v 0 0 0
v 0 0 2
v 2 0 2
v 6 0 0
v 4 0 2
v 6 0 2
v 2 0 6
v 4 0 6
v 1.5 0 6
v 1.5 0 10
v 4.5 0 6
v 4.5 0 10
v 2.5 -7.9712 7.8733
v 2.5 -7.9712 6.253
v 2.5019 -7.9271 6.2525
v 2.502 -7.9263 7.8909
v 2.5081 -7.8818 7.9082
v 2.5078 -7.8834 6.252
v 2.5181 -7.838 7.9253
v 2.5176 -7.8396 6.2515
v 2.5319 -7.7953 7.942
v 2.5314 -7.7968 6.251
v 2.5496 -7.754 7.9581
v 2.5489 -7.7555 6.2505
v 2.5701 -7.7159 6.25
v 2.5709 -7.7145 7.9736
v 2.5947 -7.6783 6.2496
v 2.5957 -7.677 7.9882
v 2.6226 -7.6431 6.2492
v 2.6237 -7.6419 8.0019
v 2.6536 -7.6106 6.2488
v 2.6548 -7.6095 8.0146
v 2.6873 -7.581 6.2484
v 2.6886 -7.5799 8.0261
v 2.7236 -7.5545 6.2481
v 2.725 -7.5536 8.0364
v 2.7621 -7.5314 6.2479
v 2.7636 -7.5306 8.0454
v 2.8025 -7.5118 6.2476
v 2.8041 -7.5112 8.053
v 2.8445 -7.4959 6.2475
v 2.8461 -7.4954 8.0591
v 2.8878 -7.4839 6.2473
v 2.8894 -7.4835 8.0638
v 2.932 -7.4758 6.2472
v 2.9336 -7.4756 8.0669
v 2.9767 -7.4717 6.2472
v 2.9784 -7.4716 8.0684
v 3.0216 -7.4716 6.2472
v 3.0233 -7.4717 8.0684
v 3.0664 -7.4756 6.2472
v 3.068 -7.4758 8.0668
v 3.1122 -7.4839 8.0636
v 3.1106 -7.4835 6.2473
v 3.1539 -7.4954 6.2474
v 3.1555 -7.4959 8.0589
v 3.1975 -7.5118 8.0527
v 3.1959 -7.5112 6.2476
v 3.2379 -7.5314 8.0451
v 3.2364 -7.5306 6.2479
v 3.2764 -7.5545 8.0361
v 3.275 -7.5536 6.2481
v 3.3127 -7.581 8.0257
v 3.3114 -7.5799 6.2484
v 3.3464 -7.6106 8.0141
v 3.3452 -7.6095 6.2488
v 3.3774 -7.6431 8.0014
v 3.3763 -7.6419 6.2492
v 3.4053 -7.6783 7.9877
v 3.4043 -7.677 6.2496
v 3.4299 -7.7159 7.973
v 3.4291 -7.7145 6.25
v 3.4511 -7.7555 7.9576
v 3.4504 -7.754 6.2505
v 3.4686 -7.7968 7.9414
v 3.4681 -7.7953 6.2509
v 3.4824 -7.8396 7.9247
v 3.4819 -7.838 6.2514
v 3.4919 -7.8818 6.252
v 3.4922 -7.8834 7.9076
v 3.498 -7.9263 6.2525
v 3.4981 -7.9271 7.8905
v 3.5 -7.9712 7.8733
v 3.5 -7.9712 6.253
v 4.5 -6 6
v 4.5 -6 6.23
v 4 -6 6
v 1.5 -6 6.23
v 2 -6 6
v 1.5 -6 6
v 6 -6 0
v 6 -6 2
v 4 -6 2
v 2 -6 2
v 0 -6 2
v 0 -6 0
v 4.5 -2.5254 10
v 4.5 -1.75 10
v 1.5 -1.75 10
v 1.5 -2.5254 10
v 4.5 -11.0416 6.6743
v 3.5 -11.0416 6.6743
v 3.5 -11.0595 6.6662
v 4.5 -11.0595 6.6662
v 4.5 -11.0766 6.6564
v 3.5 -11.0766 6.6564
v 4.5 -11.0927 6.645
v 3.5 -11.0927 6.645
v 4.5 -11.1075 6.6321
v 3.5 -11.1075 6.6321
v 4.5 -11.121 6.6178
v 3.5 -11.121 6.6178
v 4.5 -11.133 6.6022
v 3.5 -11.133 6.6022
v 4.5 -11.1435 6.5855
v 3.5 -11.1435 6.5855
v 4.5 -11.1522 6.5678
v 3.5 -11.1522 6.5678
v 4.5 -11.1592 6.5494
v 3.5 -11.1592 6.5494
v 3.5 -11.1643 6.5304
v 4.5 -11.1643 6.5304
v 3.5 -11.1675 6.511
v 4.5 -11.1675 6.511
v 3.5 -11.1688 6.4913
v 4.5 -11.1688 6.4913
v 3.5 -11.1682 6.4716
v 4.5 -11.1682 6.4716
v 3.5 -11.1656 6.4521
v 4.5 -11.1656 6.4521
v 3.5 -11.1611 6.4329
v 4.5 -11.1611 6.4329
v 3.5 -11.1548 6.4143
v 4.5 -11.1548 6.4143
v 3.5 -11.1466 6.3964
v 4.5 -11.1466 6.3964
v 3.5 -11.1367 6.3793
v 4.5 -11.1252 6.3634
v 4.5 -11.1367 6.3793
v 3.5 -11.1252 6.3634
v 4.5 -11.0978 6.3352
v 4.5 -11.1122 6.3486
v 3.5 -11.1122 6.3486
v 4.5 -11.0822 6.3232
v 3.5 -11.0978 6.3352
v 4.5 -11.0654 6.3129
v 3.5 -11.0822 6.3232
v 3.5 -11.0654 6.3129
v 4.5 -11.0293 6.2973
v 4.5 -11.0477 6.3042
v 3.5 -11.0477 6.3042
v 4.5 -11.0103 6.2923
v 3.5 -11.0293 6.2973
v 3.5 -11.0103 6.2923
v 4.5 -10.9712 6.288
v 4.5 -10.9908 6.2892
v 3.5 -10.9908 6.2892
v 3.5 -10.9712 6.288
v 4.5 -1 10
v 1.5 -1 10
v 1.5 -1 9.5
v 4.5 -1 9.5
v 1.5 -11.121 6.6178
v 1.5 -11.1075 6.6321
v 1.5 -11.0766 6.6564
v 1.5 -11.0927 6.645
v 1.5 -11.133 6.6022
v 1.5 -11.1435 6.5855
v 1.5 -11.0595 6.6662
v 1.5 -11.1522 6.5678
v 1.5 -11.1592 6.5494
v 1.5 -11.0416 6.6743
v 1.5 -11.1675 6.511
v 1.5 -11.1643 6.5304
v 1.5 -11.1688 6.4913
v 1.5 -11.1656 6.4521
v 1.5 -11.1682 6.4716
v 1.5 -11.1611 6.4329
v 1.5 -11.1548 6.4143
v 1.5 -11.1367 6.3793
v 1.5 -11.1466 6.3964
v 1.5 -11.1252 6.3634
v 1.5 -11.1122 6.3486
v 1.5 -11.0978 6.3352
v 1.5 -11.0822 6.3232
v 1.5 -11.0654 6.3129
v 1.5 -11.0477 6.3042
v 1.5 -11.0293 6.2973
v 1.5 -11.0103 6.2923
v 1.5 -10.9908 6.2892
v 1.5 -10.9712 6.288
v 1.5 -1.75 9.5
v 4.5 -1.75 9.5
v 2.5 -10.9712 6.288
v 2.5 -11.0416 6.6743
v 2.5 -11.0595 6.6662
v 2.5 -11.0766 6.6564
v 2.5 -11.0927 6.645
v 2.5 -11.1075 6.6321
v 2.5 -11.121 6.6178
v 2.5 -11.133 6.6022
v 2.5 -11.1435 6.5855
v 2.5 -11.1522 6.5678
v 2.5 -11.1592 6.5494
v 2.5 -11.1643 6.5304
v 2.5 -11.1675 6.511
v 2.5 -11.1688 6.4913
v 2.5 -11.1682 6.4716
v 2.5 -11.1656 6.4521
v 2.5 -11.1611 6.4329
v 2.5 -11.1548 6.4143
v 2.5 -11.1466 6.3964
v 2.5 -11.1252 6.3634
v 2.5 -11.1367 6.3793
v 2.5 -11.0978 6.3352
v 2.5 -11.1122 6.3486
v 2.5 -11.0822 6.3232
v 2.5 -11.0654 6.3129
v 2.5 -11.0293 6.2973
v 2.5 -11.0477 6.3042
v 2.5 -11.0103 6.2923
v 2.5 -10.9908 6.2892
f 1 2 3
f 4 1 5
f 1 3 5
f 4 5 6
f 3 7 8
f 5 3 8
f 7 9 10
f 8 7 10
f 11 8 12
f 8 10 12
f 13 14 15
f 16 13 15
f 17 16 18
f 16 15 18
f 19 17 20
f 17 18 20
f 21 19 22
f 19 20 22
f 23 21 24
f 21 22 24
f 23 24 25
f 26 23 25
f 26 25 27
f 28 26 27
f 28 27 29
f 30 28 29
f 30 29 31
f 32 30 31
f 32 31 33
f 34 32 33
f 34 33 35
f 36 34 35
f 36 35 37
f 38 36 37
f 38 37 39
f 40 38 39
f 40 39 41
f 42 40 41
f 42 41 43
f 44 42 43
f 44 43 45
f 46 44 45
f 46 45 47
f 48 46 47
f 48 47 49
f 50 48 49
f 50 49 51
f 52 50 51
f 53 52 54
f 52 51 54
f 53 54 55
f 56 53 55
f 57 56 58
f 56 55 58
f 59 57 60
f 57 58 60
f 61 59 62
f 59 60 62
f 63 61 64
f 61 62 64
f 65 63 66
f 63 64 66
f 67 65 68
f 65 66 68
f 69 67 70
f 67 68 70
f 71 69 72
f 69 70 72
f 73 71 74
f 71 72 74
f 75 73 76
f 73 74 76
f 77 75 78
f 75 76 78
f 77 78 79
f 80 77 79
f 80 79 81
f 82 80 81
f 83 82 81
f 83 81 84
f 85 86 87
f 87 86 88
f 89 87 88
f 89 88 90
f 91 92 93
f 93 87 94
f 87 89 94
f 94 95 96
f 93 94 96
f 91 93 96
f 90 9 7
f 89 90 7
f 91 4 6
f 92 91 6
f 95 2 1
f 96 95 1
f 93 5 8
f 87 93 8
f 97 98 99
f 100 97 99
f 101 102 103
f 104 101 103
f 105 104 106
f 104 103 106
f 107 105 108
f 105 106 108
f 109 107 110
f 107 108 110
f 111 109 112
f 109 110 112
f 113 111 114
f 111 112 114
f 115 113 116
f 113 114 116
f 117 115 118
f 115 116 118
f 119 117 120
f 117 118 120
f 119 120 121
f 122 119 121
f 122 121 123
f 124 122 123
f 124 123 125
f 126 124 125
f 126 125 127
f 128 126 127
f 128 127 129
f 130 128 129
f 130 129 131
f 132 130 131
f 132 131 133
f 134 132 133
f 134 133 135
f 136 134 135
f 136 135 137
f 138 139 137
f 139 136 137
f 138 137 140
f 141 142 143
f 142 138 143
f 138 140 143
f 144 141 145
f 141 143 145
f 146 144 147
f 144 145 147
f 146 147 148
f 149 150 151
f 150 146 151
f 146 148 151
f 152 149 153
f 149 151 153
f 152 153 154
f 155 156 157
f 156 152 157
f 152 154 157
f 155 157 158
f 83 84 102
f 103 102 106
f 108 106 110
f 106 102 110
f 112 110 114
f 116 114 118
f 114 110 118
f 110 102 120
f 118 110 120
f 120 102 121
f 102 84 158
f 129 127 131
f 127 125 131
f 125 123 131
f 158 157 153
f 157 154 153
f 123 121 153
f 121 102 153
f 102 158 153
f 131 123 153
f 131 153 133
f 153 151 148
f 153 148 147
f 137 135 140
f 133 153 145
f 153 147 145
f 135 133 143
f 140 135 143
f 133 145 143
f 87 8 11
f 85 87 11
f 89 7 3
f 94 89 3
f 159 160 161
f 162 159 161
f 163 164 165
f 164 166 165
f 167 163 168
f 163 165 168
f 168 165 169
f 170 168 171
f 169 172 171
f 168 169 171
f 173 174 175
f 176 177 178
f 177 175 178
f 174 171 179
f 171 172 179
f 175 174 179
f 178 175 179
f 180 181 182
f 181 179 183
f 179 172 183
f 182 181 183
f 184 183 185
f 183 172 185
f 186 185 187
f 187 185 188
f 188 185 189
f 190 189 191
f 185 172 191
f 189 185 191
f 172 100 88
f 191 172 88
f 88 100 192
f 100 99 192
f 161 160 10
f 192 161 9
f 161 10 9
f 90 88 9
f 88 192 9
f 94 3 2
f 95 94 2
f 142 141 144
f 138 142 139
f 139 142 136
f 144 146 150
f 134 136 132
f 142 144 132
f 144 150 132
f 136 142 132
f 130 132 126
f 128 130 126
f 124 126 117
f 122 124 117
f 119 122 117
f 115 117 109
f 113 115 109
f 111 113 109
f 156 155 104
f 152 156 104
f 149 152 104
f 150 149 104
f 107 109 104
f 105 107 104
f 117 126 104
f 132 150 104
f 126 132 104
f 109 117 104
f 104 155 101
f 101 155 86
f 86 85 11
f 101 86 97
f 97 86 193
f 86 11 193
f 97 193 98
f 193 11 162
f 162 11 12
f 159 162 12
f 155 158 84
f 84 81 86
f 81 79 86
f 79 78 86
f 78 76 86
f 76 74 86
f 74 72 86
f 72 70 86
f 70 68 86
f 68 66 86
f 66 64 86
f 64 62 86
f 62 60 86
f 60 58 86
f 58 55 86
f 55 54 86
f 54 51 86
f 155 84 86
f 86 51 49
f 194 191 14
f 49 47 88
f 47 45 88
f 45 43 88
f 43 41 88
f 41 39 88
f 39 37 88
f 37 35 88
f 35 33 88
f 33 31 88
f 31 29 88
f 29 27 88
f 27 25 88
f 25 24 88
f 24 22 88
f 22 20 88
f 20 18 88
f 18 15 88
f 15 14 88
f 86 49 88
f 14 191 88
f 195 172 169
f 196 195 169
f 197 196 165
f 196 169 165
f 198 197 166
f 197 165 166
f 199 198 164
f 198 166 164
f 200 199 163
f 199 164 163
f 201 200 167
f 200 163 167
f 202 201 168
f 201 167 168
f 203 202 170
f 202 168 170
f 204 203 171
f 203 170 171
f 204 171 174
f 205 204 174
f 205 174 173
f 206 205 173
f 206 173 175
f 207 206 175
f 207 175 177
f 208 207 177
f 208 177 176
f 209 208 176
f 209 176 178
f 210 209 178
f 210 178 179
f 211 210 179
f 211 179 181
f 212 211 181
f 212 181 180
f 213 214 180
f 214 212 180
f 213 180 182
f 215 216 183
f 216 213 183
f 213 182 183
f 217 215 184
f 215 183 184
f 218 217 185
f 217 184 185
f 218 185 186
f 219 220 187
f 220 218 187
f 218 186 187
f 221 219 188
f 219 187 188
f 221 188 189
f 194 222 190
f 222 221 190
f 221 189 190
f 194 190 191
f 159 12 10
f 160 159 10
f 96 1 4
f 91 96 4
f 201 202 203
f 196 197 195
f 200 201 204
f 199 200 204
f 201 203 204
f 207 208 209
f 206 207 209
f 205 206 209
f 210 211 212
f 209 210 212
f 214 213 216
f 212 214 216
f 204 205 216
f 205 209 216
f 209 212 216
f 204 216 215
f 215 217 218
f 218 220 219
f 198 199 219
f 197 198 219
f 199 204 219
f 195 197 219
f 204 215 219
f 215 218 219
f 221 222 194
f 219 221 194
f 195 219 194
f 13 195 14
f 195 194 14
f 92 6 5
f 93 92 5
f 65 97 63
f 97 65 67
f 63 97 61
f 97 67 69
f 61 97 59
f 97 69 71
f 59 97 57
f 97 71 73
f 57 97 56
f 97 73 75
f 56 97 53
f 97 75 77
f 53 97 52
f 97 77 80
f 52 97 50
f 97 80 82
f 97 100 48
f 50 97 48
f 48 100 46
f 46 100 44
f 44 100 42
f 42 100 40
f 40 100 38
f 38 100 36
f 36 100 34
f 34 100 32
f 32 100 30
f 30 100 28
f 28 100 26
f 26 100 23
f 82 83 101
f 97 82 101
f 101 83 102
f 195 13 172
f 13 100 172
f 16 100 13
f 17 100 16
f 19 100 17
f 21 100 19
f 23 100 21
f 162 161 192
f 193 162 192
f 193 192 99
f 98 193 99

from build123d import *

# Parameters (mm, degrees)
F1_DEPTH = 12
F3_DEPTH = 25
F5_DEPTH = 25


with BuildPart() as f1:
    # F0 (on Front) → F1 (new body)
    with BuildSketch(Plane.XZ):
        Polygon((0, 2), (0, 0), (6, 0), (6, 2), (4, 2), (4, 6), (4.5, 6), (4.5, 10), (1.5, 10), (1.5, 6), (2, 6), (2, 2), align=None)
    extrude(amount=F1_DEPTH)

    # F2 (on face) → F3 (cut)
    with BuildSketch(Plane(origin=(0, 0, 0), x_dir=(0, -1, 0), z_dir=(-1, 0, 0))):
        with BuildLine():
            Line((6, 6.23), (6, 0))
            Line((6, 0), (13.765802, 0))
            Line((13.765802, 0), (13.765802, 10.684827))
            Line((13.765802, 10.684827), (0, 10.684827))
            Line((0, 10.684827), (0, 10))
            Line((0, 10), (1, 10))
            Line((1, 10), (1, 9.5))
            Line((1, 9.5), (1.75, 9.5))
            Line((1.75, 9.5), (1.75, 10))
            Line((1.75, 10), (2.525424, 10))
            Line((2.525424, 10), (11.041579, 6.674281))
            ThreePointArc((11.041579, 6.674281), (11.165583, 6.452114), (10.971159, 6.287997))
            Line((10.971159, 6.287997), (6, 6.23))
        make_face()
    extrude(amount=-F3_DEPTH, mode=Mode.SUBTRACT)

    # F4 (on face) → F5 (cut)
    with BuildSketch(Plane(origin=(0, 0, 0), x_dir=(1, 0, 0), z_dir=(0, 0, -1))):
        with BuildLine():
            ThreePointArc((3.5, 11.886248), (3, 12.386248), (2.5, 11.886248))
            Line((2.5, 11.886248), (2.5, 7.971159))
            ThreePointArc((2.5, 7.971159), (3, 7.471159), (3.5, 7.971159))
            Line((3.5, 7.971159), (3.5, 11.886248))
        make_face()
    extrude(amount=-F5_DEPTH, mode=Mode.SUBTRACT)


solid = f1.part
